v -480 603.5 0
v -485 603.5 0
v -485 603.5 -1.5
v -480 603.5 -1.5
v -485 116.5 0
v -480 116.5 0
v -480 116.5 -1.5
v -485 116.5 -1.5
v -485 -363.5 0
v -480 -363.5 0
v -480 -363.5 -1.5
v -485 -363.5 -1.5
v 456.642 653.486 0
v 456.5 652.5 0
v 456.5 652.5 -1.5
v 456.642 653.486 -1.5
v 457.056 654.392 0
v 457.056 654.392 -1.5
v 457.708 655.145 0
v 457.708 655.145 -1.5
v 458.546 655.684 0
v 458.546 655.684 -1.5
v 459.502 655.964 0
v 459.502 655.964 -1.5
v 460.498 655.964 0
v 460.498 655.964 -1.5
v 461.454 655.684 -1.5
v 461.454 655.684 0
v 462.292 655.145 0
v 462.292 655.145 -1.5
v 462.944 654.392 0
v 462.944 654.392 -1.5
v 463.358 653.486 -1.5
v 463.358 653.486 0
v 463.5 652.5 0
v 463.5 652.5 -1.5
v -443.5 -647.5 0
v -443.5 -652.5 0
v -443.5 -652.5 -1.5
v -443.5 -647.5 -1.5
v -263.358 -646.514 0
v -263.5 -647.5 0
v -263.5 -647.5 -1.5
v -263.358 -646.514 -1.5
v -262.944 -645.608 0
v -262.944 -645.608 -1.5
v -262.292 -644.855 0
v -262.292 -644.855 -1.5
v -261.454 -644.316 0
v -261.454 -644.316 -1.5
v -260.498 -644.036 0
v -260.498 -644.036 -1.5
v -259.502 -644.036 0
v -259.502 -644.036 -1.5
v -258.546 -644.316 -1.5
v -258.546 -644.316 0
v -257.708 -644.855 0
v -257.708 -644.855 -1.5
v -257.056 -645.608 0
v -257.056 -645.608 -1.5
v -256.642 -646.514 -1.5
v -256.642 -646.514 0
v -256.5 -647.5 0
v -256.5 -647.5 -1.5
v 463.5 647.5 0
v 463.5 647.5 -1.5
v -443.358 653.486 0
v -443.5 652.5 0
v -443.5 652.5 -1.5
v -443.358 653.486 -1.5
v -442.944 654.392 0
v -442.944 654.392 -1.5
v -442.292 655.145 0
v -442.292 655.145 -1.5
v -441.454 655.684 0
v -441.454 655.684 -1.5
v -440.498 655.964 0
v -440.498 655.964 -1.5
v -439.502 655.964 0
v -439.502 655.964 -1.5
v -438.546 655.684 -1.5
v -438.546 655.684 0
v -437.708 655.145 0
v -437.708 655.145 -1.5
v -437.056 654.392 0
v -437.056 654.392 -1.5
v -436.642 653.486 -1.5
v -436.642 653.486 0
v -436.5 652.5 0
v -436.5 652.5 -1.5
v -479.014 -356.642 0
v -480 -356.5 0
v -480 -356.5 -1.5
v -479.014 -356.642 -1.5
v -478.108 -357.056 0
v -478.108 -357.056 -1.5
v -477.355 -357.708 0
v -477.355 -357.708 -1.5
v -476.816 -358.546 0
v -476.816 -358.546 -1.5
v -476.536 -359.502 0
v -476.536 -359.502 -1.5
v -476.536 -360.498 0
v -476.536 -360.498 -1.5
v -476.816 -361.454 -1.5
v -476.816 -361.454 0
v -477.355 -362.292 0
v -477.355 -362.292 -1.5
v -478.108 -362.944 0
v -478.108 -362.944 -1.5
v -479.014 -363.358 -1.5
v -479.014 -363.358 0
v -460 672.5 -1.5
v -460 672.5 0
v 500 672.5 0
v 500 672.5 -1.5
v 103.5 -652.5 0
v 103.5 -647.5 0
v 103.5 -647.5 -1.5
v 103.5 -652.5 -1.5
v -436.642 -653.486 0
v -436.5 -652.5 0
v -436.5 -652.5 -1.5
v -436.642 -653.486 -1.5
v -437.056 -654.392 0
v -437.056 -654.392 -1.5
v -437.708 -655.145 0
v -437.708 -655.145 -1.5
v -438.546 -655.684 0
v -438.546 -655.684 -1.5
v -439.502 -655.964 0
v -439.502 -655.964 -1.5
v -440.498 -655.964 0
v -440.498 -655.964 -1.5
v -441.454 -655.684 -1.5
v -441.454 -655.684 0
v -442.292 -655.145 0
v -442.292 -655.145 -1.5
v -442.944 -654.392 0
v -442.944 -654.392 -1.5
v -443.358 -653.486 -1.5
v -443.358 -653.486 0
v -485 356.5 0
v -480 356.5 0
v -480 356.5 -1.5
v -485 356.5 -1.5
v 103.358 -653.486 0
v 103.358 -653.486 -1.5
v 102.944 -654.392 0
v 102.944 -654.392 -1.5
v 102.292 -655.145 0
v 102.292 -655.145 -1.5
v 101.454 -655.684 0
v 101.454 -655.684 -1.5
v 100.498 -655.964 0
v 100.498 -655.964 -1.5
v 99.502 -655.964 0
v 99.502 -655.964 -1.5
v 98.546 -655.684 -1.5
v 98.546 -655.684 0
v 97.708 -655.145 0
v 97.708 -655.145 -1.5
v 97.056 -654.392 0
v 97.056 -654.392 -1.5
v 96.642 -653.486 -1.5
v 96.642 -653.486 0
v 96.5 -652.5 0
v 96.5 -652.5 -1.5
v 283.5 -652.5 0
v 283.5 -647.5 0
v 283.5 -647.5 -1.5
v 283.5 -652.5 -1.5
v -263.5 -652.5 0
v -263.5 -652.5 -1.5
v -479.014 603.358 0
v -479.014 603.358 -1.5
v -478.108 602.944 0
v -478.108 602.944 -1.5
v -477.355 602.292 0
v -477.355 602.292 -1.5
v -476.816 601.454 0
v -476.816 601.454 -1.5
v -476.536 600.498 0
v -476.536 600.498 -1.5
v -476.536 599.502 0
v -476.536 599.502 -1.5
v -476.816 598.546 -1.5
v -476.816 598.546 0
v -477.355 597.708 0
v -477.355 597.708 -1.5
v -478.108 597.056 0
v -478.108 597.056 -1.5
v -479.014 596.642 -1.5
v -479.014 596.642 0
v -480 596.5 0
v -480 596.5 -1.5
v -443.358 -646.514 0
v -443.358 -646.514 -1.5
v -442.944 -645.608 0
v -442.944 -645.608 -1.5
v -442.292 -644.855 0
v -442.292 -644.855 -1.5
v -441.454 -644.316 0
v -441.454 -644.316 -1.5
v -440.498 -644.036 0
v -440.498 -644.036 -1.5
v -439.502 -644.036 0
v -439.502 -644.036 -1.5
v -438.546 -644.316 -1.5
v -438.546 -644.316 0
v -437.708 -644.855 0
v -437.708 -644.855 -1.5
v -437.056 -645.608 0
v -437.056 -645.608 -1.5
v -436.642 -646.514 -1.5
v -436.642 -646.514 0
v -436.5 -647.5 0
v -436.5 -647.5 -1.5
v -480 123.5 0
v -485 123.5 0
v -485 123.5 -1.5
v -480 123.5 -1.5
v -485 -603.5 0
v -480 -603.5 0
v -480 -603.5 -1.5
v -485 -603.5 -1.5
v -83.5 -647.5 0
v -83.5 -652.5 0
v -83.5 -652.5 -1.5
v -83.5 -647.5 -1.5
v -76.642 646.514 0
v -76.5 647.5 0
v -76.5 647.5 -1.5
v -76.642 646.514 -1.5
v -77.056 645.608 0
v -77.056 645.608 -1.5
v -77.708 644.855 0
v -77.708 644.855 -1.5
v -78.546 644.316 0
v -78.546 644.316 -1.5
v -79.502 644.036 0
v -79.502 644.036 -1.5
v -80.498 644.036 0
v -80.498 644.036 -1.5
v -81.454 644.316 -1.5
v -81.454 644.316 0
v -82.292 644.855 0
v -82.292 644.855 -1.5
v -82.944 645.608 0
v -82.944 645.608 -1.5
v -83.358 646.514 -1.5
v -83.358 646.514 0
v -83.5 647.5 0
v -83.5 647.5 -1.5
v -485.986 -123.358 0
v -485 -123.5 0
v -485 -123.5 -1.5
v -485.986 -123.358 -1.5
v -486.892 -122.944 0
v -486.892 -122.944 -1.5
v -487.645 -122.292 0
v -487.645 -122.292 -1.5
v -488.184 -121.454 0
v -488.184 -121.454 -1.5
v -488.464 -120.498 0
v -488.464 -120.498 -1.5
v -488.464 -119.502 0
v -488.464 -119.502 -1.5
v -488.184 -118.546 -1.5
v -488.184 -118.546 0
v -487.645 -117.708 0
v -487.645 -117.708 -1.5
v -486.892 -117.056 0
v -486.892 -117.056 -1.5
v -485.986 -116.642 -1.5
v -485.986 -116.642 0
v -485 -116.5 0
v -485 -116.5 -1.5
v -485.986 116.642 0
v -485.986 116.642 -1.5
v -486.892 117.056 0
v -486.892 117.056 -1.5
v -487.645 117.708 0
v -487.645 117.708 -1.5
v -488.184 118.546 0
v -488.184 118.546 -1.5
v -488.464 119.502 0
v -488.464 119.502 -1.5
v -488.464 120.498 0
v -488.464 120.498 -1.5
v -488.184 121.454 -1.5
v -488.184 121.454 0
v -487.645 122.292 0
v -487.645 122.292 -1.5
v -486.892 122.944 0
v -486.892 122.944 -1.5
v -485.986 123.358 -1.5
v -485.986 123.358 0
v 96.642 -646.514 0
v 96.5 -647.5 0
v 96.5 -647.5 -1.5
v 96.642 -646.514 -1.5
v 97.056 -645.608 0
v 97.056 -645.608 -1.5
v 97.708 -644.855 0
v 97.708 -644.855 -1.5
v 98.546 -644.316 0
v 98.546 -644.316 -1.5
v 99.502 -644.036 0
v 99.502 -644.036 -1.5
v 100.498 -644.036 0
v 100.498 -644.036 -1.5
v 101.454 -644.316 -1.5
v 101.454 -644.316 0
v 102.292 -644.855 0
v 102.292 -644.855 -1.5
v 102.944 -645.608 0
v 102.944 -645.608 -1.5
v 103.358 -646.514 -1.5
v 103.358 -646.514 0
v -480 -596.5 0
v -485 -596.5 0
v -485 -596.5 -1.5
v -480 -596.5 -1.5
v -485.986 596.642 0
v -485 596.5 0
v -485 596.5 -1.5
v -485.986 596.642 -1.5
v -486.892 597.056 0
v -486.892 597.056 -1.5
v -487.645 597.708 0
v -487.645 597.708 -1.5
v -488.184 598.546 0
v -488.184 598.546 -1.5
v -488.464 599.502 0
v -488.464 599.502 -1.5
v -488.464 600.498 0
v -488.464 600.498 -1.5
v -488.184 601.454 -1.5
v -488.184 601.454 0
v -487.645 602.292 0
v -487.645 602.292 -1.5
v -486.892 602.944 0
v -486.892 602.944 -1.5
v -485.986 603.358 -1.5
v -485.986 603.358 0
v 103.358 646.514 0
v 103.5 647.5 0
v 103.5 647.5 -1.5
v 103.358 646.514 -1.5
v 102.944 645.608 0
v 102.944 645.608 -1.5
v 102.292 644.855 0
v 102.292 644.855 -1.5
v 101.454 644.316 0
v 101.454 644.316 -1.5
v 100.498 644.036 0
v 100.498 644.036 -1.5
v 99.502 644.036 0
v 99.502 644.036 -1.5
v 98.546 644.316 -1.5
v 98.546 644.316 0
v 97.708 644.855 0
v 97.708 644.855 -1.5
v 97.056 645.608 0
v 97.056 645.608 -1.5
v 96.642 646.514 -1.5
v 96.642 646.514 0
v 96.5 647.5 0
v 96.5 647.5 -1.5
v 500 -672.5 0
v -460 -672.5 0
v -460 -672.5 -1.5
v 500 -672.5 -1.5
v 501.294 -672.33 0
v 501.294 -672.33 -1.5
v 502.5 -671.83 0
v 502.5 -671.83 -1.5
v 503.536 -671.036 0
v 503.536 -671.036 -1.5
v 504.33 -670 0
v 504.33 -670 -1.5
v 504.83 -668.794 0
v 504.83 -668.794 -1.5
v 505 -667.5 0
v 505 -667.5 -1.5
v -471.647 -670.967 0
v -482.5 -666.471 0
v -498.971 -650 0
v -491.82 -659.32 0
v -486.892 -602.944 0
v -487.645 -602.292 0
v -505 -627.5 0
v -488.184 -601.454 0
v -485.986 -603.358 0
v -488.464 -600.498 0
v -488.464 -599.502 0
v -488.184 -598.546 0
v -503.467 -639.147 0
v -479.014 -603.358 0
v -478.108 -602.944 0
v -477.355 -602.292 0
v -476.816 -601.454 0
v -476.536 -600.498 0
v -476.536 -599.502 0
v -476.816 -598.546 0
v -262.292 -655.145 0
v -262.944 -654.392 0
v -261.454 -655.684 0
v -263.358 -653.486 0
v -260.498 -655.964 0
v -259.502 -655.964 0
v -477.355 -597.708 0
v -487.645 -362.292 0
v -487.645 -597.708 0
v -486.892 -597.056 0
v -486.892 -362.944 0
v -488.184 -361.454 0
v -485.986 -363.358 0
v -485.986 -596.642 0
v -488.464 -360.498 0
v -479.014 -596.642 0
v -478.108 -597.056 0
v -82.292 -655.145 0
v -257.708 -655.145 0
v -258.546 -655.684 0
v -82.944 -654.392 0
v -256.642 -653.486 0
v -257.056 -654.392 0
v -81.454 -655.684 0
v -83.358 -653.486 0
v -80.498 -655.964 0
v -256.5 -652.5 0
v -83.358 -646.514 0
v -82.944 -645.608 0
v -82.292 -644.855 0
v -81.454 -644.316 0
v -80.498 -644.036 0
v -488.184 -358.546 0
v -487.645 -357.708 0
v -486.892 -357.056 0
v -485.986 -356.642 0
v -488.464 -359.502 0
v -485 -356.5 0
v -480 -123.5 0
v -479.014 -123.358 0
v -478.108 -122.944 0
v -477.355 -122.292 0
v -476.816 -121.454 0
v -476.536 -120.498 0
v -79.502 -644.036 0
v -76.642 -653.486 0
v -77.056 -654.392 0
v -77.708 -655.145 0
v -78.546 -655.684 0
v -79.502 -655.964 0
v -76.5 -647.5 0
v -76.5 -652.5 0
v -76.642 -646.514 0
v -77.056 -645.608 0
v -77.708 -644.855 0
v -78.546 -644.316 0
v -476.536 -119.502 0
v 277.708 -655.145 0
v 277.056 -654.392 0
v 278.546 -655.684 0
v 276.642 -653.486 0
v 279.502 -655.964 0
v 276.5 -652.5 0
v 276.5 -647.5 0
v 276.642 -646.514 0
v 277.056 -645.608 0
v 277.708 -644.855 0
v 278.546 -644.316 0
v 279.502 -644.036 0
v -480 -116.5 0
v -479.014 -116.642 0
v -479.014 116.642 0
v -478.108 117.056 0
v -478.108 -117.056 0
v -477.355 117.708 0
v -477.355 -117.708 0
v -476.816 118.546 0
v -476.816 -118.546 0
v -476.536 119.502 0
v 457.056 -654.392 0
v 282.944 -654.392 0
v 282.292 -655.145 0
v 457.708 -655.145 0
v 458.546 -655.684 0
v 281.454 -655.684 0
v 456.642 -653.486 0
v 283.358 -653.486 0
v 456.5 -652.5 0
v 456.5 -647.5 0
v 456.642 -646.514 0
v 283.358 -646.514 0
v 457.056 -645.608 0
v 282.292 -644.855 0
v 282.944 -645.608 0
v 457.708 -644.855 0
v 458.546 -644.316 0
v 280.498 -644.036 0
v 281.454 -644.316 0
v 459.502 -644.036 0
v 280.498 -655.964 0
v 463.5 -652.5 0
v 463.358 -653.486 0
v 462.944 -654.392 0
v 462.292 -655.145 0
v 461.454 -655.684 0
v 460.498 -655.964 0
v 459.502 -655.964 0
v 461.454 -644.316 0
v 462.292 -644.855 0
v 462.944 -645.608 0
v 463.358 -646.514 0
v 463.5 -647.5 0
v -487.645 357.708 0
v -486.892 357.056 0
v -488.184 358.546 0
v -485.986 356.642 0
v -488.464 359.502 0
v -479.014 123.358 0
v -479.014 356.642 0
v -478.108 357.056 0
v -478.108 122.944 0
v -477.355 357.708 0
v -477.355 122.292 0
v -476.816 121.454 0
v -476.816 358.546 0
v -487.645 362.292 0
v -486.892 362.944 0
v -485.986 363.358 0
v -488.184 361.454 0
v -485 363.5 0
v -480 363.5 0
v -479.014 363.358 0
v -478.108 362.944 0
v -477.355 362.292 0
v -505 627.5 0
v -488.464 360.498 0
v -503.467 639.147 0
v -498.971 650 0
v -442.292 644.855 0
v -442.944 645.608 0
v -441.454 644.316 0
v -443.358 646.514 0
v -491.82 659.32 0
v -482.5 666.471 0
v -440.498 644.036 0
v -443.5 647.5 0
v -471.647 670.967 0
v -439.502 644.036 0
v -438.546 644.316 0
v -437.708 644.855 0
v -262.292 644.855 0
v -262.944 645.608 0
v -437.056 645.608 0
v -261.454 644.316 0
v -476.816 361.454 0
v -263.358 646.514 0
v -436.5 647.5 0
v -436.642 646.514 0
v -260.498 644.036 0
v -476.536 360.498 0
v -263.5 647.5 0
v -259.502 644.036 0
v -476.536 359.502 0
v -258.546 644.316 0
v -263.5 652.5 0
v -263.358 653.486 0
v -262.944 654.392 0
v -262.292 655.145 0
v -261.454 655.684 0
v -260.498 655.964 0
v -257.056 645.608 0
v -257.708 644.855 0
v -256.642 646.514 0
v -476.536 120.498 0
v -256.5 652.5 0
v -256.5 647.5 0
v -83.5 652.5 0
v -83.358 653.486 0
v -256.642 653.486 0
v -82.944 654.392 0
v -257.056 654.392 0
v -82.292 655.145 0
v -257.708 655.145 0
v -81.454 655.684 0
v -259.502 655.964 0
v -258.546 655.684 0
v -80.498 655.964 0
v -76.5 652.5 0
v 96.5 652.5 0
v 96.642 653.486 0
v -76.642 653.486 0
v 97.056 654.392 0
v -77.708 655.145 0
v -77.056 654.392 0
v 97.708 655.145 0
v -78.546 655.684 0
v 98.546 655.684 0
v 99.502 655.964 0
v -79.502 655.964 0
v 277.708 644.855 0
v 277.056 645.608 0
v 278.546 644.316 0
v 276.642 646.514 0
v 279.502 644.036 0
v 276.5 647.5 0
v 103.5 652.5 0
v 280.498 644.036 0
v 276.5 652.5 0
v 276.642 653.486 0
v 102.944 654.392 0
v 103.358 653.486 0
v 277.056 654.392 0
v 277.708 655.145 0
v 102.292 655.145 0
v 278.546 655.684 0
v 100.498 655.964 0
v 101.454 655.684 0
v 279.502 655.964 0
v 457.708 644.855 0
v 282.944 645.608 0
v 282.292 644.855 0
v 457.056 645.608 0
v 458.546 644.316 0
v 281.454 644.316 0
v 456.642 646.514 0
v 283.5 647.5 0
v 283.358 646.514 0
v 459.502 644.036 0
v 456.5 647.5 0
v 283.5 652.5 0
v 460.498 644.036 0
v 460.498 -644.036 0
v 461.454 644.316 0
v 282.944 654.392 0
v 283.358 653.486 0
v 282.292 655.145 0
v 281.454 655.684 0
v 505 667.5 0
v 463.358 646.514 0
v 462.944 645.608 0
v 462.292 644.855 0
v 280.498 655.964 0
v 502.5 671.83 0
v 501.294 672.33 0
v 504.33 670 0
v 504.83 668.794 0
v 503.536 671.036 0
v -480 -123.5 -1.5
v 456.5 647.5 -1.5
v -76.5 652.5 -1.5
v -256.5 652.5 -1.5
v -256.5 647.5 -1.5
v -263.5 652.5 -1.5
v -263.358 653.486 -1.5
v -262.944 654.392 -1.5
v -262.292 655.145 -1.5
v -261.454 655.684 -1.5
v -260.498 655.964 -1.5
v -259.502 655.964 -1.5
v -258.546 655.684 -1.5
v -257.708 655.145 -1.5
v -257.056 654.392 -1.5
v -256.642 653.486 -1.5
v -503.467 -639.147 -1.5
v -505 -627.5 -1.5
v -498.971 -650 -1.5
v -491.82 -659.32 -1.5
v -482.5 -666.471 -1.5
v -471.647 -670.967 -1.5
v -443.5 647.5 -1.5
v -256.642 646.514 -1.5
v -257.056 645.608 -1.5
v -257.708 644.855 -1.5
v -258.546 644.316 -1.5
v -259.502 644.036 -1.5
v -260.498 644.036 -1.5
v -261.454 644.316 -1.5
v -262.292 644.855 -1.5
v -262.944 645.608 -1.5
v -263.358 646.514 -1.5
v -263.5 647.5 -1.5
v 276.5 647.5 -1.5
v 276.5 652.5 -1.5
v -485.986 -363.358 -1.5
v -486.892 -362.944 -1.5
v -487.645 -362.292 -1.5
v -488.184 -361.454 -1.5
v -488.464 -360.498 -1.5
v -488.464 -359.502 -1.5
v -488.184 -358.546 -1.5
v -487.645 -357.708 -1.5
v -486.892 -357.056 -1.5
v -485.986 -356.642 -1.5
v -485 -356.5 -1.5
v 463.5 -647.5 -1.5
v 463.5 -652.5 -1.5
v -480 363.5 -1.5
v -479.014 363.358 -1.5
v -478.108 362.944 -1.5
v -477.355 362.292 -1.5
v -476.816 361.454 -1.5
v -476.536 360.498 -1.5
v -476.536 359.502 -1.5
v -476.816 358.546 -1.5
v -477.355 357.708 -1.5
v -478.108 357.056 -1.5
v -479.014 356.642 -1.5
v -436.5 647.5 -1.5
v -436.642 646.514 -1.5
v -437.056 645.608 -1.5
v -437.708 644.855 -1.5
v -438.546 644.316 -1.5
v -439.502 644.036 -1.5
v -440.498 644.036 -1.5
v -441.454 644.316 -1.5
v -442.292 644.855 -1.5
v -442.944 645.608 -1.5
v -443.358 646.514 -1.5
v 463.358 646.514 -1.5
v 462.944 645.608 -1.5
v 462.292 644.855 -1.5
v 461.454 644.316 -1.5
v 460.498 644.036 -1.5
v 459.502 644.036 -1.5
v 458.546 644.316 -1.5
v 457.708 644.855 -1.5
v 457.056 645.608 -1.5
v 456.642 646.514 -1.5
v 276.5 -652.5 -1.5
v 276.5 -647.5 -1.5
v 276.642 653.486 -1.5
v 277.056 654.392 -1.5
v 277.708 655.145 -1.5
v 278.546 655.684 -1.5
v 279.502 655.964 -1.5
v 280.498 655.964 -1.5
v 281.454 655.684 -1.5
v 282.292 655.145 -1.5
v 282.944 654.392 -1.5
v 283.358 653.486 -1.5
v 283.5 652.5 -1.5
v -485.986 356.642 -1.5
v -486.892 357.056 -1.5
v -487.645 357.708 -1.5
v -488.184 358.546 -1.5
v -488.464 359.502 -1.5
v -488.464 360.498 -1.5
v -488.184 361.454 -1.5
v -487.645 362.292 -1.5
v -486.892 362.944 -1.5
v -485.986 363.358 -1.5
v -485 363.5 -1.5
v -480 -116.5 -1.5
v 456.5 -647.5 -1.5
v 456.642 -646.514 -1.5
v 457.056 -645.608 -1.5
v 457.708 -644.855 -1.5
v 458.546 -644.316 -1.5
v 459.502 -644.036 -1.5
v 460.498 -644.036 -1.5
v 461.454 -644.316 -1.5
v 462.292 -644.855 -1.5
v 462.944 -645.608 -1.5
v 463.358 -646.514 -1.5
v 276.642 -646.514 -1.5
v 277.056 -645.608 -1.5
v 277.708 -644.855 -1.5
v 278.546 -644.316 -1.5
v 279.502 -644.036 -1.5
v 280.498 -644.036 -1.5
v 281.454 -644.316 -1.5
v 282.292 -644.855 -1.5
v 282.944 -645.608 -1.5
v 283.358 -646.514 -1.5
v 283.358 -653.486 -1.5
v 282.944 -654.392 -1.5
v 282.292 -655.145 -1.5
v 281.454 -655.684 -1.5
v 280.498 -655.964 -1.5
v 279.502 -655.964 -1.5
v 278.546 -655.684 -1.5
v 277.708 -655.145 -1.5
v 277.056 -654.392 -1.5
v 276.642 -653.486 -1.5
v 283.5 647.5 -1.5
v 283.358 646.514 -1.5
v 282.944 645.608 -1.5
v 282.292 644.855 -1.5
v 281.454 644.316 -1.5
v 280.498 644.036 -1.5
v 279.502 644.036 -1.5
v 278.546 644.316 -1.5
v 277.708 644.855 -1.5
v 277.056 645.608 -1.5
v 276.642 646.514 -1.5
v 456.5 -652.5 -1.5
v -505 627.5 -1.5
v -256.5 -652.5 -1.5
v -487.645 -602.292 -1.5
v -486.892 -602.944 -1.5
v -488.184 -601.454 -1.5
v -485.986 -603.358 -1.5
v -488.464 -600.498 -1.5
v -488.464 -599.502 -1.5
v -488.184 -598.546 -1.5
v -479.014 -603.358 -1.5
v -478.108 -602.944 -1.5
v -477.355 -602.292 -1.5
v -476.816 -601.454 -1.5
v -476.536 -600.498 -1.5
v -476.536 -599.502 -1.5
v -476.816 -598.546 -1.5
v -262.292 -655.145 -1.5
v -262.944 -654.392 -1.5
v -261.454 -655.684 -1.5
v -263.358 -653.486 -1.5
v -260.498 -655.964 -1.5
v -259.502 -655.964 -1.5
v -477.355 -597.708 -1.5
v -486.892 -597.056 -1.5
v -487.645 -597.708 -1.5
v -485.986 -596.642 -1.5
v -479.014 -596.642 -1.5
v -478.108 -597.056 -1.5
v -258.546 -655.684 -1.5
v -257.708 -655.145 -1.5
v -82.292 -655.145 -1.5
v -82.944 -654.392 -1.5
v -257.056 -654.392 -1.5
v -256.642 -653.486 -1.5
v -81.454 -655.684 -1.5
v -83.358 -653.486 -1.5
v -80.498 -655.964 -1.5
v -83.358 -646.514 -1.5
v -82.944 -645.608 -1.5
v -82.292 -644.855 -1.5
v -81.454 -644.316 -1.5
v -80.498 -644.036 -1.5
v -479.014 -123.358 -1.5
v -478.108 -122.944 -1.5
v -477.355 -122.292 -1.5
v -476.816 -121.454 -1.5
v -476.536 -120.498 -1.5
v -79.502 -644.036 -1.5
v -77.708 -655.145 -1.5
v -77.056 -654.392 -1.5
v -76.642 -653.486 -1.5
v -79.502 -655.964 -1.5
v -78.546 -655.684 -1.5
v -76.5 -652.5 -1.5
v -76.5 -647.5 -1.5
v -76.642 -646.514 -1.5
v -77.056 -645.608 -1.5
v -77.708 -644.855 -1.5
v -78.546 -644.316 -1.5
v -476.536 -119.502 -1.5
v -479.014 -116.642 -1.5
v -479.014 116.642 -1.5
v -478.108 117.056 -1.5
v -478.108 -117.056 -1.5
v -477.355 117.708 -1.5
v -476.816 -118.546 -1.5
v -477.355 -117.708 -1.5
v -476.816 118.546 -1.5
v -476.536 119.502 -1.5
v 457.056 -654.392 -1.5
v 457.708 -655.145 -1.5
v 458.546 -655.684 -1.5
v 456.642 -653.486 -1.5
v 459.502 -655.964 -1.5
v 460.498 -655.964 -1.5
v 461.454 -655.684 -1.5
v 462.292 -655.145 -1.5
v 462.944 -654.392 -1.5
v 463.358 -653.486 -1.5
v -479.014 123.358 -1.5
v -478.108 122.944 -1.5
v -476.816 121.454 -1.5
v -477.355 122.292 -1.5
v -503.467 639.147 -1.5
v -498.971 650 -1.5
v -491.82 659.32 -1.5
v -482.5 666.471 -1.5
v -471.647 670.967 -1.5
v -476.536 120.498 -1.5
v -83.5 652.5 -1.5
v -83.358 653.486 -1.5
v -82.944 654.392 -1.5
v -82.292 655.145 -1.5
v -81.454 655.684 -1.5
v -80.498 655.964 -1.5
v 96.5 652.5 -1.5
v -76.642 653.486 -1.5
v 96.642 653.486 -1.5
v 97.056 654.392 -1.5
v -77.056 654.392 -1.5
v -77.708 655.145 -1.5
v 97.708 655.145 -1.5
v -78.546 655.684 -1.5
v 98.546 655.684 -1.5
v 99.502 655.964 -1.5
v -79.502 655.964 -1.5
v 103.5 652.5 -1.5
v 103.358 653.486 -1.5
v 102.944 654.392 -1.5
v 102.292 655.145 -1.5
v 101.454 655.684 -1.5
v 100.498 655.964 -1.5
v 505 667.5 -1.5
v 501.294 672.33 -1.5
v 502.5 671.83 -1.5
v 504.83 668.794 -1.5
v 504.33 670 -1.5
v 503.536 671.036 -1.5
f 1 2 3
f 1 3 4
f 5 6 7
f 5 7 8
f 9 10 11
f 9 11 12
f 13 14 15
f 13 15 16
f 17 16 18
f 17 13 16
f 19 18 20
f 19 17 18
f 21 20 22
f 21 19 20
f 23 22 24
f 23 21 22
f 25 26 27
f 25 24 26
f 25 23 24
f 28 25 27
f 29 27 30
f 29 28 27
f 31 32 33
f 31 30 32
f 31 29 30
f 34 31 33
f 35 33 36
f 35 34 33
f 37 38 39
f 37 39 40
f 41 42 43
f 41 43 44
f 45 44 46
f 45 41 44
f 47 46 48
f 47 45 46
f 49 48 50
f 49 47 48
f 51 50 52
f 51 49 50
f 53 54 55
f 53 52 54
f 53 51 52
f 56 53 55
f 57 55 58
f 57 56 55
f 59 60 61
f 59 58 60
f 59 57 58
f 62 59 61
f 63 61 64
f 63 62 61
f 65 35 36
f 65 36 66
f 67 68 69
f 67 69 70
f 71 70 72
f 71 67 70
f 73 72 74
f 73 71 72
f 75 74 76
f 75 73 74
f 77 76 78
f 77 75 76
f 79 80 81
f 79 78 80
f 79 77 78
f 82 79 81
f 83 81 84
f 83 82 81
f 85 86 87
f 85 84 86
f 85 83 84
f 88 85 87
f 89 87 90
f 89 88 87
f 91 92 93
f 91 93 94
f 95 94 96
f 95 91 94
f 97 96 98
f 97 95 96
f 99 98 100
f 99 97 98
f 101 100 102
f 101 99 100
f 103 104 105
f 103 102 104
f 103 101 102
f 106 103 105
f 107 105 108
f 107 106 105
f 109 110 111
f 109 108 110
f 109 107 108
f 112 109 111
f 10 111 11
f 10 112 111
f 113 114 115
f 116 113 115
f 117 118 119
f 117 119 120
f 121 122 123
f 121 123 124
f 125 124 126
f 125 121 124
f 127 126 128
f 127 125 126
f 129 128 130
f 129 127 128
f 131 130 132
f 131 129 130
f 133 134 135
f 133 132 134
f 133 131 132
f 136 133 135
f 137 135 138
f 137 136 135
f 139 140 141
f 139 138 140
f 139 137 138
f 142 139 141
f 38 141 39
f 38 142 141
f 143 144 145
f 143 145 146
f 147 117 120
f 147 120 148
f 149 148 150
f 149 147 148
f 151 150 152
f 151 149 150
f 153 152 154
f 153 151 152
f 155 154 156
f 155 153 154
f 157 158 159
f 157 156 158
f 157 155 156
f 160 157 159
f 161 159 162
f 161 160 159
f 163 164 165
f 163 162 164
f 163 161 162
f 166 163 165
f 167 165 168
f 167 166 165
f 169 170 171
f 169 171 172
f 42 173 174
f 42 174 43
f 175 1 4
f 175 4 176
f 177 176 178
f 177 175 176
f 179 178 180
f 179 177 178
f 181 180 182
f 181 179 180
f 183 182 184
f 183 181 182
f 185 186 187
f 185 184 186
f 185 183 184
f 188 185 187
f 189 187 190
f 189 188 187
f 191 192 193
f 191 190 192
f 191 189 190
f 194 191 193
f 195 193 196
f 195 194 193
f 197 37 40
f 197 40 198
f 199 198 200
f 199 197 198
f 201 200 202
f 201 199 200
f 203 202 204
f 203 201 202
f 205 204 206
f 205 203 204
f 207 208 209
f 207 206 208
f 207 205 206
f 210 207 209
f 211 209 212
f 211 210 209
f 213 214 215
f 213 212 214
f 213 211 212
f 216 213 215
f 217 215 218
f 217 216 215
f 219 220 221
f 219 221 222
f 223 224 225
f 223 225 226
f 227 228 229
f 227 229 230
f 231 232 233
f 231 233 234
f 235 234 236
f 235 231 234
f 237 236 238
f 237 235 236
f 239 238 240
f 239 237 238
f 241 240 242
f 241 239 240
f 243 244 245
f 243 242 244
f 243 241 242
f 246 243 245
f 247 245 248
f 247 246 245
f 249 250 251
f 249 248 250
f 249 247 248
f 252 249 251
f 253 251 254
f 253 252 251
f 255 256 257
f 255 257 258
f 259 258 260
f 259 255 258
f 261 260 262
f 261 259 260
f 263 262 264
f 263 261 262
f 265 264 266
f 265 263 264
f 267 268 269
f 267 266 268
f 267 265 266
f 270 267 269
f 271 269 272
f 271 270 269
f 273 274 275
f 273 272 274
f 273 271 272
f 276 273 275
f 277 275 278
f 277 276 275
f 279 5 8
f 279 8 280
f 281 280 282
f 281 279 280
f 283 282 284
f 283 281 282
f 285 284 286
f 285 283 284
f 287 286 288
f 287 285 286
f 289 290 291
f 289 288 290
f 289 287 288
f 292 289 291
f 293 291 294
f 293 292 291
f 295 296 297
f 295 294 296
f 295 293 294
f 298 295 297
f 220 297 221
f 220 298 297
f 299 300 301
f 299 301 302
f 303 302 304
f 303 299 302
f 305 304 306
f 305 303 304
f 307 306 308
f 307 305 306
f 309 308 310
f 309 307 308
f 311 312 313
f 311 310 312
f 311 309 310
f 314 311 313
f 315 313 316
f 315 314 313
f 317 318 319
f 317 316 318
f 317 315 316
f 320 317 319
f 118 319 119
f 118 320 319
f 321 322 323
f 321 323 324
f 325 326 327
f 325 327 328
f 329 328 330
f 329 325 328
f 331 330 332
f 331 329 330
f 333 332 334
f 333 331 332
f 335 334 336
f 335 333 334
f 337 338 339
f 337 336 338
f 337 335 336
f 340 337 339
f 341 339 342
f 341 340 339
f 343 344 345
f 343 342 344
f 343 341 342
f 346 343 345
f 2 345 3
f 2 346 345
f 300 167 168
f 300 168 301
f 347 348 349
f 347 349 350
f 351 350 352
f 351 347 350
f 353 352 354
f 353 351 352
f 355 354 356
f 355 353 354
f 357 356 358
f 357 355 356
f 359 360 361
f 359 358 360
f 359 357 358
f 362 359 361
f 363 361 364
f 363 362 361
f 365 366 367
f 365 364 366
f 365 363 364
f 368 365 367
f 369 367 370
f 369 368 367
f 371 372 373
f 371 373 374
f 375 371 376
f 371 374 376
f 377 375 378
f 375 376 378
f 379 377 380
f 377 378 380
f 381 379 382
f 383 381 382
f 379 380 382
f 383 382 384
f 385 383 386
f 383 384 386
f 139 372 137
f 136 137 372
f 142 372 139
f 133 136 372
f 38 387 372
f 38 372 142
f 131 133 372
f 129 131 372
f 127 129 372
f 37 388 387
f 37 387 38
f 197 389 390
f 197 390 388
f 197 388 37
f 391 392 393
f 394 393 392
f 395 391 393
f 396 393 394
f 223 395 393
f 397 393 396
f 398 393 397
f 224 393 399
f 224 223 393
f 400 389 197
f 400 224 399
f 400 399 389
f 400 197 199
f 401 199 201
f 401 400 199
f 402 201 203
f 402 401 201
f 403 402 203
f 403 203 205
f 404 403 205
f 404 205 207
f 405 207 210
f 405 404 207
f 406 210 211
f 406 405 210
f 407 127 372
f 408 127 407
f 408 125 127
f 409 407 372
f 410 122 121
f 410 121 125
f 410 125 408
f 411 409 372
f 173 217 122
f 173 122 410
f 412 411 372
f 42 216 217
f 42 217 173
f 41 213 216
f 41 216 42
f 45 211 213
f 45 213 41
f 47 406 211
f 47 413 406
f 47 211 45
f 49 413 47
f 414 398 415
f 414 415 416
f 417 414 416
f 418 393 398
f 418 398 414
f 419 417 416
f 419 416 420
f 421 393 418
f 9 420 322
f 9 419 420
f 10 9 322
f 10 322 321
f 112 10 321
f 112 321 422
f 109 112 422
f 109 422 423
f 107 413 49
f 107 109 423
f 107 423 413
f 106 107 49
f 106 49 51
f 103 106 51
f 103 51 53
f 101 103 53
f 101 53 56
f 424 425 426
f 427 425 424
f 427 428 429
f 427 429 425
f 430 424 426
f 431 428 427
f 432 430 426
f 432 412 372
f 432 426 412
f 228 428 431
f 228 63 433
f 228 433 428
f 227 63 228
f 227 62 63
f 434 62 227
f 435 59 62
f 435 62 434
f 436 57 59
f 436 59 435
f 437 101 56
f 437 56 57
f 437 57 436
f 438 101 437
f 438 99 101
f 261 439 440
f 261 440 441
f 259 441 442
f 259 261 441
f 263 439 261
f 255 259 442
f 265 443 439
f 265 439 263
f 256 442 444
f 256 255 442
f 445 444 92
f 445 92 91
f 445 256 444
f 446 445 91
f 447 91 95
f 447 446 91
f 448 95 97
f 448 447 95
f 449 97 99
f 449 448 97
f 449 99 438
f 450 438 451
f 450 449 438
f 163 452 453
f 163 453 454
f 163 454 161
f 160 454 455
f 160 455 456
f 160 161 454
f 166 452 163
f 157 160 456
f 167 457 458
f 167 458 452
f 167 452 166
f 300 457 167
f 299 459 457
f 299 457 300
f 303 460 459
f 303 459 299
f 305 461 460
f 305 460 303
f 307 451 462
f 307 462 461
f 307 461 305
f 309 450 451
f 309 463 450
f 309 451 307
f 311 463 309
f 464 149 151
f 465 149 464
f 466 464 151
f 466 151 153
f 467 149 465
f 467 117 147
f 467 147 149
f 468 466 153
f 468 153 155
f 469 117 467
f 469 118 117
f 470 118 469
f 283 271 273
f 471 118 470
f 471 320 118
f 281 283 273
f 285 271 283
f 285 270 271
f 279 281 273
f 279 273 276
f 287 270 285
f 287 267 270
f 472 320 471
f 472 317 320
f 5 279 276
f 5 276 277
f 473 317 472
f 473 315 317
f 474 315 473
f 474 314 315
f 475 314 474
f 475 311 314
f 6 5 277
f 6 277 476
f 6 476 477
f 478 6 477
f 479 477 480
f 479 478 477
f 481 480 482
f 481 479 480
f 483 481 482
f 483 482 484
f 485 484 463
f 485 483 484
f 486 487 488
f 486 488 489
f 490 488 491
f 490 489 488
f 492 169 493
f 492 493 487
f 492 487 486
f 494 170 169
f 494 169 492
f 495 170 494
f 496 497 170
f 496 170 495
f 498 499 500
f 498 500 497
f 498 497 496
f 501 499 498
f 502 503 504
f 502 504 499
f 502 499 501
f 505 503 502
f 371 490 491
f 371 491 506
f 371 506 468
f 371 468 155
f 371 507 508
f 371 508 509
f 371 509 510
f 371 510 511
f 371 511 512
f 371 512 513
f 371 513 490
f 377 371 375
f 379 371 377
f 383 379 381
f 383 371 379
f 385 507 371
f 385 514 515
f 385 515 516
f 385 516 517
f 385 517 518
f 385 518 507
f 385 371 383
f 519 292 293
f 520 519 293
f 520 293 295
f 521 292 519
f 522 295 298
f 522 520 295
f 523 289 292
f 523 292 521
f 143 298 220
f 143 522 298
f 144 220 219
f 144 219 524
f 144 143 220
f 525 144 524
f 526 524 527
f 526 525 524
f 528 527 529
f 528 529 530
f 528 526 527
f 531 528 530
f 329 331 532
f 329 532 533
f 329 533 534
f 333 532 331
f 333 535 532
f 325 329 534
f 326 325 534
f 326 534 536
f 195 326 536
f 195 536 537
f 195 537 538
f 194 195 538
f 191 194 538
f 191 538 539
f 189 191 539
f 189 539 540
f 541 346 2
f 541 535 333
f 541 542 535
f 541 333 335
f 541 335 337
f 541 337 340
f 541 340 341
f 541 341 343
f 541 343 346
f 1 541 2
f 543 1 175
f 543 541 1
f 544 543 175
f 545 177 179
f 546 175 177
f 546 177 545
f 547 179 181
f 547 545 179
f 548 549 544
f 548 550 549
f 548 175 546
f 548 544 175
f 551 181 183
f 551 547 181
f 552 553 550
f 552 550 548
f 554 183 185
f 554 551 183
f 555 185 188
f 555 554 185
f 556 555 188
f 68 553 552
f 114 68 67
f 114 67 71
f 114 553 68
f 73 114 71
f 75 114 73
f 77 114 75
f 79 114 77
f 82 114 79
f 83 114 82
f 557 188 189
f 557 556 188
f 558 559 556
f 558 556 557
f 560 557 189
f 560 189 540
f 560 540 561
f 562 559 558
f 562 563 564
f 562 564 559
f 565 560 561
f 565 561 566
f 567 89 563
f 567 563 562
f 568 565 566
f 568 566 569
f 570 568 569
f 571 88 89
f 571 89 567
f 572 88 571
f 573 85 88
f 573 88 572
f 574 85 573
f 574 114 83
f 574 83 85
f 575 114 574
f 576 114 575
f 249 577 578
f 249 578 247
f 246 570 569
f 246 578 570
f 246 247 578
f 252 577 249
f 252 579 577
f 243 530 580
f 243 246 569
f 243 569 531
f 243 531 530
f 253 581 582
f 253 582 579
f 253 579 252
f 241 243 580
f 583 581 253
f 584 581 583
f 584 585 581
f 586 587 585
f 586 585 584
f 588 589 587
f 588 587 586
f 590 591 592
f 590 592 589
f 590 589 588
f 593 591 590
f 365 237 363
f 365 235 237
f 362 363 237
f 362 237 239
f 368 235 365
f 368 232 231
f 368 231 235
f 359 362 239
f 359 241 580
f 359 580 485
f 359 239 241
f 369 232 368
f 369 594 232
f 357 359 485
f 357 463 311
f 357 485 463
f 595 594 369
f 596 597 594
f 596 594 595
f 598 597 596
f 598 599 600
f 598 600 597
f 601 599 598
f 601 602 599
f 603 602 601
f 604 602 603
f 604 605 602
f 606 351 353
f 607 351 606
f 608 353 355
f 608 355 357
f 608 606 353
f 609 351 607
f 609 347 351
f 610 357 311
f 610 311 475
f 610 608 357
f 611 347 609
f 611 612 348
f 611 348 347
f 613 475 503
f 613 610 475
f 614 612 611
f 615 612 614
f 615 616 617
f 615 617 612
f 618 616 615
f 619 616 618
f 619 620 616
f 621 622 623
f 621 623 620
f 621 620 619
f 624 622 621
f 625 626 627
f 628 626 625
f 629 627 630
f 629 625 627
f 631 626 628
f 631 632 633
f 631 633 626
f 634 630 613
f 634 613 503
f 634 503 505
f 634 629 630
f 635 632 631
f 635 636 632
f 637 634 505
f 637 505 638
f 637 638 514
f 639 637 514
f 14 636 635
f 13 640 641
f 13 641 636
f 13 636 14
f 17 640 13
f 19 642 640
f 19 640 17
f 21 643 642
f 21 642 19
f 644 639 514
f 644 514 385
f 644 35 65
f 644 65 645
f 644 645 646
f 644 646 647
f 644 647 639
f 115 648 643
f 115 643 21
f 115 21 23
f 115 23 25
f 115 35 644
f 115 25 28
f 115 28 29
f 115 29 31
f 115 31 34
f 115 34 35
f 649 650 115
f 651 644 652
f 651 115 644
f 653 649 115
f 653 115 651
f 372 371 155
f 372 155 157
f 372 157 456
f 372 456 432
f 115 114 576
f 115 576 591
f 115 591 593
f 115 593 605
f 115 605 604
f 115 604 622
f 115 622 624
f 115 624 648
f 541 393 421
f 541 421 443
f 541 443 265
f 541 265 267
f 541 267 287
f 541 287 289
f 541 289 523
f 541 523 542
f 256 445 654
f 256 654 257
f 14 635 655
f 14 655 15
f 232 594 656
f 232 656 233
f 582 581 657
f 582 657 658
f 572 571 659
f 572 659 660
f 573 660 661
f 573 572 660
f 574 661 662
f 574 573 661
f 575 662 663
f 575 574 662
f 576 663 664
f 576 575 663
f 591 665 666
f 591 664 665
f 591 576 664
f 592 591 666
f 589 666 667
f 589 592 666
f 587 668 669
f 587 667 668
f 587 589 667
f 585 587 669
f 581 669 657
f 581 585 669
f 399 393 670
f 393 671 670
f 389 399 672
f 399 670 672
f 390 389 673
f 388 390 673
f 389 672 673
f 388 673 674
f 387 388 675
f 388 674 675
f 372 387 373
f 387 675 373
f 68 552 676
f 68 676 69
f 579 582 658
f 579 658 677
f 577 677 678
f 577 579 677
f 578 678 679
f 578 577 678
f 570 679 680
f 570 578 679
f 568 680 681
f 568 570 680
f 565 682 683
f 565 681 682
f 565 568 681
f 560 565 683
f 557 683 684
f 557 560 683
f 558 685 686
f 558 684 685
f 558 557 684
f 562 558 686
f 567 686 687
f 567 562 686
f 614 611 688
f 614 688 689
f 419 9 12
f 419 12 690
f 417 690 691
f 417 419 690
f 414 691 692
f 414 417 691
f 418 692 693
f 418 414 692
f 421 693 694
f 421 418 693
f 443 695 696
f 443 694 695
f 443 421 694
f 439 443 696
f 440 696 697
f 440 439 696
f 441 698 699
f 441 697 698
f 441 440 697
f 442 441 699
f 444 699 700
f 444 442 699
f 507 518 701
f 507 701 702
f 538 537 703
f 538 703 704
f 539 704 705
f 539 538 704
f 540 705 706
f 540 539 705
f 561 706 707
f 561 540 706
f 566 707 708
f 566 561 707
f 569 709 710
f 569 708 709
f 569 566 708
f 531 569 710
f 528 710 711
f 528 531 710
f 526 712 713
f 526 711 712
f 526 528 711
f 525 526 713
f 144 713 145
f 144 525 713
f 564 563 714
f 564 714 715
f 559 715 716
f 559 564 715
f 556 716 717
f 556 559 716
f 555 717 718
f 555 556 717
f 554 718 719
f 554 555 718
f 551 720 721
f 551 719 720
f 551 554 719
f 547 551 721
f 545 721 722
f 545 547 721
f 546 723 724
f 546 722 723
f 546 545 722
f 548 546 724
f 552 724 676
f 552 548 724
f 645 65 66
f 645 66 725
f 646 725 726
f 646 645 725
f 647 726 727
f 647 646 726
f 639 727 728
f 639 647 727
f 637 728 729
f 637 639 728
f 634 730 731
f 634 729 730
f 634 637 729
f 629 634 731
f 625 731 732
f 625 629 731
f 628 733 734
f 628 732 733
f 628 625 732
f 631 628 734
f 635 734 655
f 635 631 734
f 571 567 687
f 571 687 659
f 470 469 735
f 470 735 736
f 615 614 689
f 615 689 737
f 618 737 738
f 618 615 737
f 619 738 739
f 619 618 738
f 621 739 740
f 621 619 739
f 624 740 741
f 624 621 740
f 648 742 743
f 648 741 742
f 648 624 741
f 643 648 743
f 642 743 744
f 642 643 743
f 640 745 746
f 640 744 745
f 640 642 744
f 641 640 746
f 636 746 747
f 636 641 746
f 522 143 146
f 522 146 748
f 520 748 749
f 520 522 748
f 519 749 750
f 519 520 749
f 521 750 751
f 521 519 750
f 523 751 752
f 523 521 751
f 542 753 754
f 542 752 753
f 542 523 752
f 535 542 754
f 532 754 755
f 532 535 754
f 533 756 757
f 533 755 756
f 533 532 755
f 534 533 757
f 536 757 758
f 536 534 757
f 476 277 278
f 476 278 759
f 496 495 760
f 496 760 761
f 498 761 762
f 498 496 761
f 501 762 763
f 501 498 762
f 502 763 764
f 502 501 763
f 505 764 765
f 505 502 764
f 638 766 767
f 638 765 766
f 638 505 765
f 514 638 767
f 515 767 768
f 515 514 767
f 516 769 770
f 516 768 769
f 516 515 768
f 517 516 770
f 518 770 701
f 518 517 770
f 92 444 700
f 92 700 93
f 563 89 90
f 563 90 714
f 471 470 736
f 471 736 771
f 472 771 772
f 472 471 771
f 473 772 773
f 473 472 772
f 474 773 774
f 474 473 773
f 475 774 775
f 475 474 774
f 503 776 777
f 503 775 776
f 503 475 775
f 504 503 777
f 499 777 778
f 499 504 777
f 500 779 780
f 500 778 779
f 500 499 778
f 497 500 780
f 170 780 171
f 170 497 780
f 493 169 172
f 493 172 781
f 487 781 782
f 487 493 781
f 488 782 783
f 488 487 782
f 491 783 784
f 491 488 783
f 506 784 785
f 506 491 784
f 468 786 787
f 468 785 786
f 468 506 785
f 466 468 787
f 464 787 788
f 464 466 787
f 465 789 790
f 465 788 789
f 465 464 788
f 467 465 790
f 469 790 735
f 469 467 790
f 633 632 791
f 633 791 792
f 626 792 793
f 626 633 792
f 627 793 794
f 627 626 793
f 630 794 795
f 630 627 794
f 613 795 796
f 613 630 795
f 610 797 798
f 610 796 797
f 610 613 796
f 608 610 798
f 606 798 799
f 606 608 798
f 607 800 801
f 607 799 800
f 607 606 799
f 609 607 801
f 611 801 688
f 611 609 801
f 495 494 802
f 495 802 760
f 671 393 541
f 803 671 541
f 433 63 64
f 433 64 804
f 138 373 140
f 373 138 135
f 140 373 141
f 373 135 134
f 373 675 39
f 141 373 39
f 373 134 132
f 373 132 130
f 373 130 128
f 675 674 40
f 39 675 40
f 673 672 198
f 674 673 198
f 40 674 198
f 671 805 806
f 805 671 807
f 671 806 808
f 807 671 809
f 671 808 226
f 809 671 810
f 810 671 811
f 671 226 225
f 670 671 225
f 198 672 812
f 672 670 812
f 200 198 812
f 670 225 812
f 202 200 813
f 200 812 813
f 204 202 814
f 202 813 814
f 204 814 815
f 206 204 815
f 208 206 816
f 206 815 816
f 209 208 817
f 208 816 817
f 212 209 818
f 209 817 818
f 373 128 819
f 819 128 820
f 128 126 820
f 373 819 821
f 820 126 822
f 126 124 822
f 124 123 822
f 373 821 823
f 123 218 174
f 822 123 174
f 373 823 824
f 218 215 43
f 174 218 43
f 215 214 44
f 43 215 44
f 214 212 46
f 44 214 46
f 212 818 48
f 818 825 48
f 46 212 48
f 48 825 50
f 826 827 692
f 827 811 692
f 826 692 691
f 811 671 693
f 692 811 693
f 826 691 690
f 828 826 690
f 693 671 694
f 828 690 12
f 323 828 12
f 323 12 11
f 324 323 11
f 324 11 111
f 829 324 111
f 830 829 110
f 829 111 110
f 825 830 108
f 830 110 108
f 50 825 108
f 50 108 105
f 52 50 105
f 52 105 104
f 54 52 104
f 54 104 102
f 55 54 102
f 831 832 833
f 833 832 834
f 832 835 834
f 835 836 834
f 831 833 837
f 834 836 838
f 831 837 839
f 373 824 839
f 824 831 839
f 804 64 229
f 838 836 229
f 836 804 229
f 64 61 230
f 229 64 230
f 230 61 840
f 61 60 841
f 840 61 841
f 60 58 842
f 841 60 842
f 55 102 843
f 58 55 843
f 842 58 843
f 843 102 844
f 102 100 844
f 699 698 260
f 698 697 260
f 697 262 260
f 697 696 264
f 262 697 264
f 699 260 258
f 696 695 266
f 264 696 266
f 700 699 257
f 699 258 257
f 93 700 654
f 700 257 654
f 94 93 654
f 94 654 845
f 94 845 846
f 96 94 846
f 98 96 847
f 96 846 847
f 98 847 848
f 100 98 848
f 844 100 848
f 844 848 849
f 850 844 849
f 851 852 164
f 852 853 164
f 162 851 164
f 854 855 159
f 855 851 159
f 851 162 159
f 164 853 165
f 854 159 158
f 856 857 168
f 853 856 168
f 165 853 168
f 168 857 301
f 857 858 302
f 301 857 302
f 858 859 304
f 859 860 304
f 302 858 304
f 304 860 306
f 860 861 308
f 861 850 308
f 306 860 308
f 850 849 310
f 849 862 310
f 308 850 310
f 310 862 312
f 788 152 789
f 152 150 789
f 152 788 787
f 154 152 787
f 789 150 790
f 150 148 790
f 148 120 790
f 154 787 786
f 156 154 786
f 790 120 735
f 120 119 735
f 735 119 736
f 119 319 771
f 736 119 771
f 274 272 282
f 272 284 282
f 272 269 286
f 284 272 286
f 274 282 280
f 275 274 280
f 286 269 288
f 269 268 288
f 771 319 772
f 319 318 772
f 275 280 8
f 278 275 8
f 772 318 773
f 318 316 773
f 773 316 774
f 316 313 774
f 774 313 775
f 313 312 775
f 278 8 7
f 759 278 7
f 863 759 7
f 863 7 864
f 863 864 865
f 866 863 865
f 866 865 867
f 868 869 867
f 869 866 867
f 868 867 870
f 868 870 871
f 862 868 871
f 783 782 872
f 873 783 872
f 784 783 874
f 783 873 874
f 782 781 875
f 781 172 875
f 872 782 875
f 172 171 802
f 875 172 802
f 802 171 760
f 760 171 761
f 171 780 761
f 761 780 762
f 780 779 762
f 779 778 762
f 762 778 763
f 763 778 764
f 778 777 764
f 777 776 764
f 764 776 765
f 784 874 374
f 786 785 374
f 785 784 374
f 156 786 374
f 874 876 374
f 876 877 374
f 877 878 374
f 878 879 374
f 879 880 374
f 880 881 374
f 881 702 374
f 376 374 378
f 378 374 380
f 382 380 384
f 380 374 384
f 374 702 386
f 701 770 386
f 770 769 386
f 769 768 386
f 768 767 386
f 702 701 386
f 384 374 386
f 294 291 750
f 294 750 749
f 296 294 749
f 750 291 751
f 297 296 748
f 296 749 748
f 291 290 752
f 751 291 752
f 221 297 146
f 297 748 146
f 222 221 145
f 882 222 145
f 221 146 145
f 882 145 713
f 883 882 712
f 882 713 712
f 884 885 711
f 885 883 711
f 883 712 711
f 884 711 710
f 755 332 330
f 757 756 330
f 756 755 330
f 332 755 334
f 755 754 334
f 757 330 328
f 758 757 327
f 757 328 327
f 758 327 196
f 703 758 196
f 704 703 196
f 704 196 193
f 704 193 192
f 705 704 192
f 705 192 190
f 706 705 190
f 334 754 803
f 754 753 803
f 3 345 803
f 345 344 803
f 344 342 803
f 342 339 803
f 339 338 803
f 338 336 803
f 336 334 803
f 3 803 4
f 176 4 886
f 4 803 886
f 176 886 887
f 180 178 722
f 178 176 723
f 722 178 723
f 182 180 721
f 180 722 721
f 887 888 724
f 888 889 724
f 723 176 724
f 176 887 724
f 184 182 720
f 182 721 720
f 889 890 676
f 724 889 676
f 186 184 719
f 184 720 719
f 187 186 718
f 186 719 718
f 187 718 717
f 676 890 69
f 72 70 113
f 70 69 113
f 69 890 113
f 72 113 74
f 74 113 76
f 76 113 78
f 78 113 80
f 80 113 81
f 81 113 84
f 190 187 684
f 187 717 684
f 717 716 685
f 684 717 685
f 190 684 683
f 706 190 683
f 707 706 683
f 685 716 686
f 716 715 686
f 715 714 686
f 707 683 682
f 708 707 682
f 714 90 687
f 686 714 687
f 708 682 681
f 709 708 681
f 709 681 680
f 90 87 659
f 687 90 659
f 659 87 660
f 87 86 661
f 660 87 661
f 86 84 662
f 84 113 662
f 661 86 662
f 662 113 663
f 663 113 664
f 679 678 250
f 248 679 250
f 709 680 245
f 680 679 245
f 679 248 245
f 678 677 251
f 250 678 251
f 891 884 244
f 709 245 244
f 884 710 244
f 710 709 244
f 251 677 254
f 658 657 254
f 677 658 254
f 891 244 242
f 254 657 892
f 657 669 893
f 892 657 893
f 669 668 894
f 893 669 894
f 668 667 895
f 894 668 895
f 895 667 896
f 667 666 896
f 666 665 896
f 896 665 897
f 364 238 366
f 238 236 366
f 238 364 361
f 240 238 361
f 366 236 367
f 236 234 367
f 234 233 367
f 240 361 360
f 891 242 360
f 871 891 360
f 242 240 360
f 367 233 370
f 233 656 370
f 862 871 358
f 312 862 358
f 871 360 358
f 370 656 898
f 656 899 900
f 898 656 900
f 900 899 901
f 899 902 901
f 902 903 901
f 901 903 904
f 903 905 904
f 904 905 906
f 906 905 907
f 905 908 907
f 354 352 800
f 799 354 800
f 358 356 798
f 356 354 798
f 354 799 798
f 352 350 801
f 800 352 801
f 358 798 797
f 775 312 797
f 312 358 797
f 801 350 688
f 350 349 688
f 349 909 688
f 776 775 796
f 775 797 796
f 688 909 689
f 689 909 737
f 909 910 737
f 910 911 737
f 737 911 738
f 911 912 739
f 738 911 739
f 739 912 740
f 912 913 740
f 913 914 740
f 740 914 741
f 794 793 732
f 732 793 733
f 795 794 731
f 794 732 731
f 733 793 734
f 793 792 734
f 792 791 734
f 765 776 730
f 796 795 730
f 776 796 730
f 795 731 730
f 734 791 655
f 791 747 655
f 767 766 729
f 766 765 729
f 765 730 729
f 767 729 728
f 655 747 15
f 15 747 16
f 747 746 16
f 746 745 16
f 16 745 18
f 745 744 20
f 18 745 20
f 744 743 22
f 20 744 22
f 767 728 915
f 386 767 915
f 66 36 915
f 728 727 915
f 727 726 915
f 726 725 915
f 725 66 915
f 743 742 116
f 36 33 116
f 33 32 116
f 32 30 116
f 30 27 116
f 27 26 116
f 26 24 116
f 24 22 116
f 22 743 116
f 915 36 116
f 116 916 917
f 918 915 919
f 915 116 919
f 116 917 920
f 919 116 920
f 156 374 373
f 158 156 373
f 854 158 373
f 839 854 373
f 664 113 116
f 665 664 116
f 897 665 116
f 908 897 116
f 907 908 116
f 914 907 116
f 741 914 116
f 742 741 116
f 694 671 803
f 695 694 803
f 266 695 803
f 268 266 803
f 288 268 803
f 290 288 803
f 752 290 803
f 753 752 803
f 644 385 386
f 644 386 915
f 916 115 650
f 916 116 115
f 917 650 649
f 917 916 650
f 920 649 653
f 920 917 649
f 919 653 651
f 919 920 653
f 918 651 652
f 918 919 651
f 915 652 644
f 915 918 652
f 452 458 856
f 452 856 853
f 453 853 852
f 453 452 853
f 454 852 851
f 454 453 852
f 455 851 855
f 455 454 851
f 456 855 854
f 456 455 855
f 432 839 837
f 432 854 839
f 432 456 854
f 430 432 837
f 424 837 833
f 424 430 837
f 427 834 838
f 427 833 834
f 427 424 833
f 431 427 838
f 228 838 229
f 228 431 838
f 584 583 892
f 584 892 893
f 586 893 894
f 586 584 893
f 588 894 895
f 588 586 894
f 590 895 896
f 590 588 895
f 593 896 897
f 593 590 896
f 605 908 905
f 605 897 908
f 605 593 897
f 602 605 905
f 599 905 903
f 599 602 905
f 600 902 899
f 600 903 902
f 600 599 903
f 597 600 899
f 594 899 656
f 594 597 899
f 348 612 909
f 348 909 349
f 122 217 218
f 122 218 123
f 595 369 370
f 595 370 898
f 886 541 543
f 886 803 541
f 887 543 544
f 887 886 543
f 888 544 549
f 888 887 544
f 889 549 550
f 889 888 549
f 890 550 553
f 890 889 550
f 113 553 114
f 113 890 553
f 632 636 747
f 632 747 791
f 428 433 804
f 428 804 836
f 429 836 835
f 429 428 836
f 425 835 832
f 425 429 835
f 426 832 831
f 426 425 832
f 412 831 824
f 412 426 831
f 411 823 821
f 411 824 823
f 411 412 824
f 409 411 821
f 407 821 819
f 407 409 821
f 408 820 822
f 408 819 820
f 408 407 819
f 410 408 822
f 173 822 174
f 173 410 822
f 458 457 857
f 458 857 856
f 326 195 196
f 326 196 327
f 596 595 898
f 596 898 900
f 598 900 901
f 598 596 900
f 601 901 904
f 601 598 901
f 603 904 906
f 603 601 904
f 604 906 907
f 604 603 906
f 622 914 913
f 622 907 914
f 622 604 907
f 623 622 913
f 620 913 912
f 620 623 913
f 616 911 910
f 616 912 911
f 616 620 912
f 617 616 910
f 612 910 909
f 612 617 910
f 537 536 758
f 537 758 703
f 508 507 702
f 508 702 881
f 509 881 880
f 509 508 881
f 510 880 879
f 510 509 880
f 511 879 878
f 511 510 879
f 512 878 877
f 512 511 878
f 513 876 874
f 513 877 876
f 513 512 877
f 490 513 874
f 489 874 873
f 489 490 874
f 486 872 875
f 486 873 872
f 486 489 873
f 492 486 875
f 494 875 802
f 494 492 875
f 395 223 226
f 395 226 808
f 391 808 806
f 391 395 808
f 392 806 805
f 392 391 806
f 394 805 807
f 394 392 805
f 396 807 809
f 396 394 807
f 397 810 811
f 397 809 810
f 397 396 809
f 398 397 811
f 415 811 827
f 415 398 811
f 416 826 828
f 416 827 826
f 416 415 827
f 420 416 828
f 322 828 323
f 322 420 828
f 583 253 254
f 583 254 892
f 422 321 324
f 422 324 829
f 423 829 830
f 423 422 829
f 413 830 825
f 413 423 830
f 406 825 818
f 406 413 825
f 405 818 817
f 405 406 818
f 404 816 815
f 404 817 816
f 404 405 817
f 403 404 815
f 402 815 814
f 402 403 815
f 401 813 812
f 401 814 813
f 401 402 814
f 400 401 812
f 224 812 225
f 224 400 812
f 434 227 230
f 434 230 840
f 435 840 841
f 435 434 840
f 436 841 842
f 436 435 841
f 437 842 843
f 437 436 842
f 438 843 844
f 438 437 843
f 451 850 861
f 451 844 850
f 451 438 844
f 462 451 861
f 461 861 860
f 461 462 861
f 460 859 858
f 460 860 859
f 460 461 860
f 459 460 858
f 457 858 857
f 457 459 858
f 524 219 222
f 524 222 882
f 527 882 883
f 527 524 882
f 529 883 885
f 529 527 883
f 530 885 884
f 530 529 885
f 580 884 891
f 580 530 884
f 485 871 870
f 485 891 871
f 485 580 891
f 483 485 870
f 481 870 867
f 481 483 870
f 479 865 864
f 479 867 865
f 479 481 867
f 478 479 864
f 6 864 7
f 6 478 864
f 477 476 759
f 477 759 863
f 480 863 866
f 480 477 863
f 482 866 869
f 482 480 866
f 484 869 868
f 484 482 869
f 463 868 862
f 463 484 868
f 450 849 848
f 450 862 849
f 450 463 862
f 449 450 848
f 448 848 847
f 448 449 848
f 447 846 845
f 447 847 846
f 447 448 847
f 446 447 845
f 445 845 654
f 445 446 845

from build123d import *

# Parameters (mm, degrees)
SKETCH_1_W             = 1010
SKETCH_1_H             = 1345
SM_BASE_FLANGE_1_DEPTH = 1.5
FILLET_1_R             = 45
FILLET_2_R             = 5
CUT_EXTRUDE_1_DEPTH    = 10
PATTERN_LINEAR_1_COUNT = 6
PATTERN_LINEAR_1_PITCH = 240
CUT_EXTRUDE_2_DEPTH    = 10
PATTERN_LINEAR_2_COUNT = 6
PATTERN_LINEAR_2_PITCH = 180


# Sheet-metal steps are written as plain solids
with BuildPart() as part:
    # Sketch 1 → 基体-法兰1 (new body)
    with BuildSketch(Plane.XY):
        Rectangle(SKETCH_1_W, SKETCH_1_H)
    extrude(amount=-SM_BASE_FLANGE_1_DEPTH)

    # 圆角1
    fillet_1_edges = [part.edges().sort_by_distance(p)[0] for p in [
        (-505, 672.5, -0.75),
        (-505, -672.5, -0.75),
    ]]
    fillet(fillet_1_edges, radius=FILLET_1_R)

    # 圆角2
    fillet_2_edges = [part.edges().sort_by_distance(p)[0] for p in [
        (505, 672.5, -0.75),
        (505, -672.5, -0.75),
    ]]
    fillet(fillet_2_edges, radius=FILLET_2_R)

    # Sketch 2 → 切除-拉伸1 (cut)
    with BuildSketch(Plane.XY):
        with BuildLine():
            Line((-485, -596.5), (-480, -596.5))
            ThreePointArc((-480, -596.5), (-476.5, -600), (-480, -603.5))
            Line((-480, -603.5), (-485, -603.5))
            ThreePointArc((-485, -603.5), (-488.5, -600), (-485, -596.5))
        make_face()
    cut_extrude_1 = extrude(amount=-CUT_EXTRUDE_1_DEPTH, mode=Mode.SUBTRACT)

    # 阵列(线性)1: 切除-拉伸1 ×6
    with Locations(*[(0, i * PATTERN_LINEAR_1_PITCH, 0) for i in range(1, PATTERN_LINEAR_1_COUNT)]):
        add(cut_extrude_1, mode=Mode.SUBTRACT)

    # 草图3 → 切除-拉伸2 (cut)
    with BuildSketch(Plane.XY):
        with BuildLine():
            Line((-436.5, 652.5), (-436.5, 647.5))
            ThreePointArc((-436.5, 647.5), (-440, 644), (-443.5, 647.5))
            Line((-443.5, 647.5), (-443.5, 652.5))
            ThreePointArc((-443.5, 652.5), (-440, 656), (-436.5, 652.5))
        make_face()
        with BuildLine():
            Line((-436.5, -647.5), (-436.5, -652.5))
            ThreePointArc((-436.5, -652.5), (-440, -656), (-443.5, -652.5))
            Line((-443.5, -652.5), (-443.5, -647.5))
            ThreePointArc((-443.5, -647.5), (-440, -644), (-436.5, -647.5))
        make_face()
    cut_extrude_2 = extrude(amount=-CUT_EXTRUDE_2_DEPTH, mode=Mode.SUBTRACT)

    # 阵列(线性)2: 切除-拉伸2 ×6
    with Locations(*[(i * PATTERN_LINEAR_2_PITCH, 0, 0) for i in range(1, PATTERN_LINEAR_2_COUNT)]):
        add(cut_extrude_2, mode=Mode.SUBTRACT)


solid = part.part
